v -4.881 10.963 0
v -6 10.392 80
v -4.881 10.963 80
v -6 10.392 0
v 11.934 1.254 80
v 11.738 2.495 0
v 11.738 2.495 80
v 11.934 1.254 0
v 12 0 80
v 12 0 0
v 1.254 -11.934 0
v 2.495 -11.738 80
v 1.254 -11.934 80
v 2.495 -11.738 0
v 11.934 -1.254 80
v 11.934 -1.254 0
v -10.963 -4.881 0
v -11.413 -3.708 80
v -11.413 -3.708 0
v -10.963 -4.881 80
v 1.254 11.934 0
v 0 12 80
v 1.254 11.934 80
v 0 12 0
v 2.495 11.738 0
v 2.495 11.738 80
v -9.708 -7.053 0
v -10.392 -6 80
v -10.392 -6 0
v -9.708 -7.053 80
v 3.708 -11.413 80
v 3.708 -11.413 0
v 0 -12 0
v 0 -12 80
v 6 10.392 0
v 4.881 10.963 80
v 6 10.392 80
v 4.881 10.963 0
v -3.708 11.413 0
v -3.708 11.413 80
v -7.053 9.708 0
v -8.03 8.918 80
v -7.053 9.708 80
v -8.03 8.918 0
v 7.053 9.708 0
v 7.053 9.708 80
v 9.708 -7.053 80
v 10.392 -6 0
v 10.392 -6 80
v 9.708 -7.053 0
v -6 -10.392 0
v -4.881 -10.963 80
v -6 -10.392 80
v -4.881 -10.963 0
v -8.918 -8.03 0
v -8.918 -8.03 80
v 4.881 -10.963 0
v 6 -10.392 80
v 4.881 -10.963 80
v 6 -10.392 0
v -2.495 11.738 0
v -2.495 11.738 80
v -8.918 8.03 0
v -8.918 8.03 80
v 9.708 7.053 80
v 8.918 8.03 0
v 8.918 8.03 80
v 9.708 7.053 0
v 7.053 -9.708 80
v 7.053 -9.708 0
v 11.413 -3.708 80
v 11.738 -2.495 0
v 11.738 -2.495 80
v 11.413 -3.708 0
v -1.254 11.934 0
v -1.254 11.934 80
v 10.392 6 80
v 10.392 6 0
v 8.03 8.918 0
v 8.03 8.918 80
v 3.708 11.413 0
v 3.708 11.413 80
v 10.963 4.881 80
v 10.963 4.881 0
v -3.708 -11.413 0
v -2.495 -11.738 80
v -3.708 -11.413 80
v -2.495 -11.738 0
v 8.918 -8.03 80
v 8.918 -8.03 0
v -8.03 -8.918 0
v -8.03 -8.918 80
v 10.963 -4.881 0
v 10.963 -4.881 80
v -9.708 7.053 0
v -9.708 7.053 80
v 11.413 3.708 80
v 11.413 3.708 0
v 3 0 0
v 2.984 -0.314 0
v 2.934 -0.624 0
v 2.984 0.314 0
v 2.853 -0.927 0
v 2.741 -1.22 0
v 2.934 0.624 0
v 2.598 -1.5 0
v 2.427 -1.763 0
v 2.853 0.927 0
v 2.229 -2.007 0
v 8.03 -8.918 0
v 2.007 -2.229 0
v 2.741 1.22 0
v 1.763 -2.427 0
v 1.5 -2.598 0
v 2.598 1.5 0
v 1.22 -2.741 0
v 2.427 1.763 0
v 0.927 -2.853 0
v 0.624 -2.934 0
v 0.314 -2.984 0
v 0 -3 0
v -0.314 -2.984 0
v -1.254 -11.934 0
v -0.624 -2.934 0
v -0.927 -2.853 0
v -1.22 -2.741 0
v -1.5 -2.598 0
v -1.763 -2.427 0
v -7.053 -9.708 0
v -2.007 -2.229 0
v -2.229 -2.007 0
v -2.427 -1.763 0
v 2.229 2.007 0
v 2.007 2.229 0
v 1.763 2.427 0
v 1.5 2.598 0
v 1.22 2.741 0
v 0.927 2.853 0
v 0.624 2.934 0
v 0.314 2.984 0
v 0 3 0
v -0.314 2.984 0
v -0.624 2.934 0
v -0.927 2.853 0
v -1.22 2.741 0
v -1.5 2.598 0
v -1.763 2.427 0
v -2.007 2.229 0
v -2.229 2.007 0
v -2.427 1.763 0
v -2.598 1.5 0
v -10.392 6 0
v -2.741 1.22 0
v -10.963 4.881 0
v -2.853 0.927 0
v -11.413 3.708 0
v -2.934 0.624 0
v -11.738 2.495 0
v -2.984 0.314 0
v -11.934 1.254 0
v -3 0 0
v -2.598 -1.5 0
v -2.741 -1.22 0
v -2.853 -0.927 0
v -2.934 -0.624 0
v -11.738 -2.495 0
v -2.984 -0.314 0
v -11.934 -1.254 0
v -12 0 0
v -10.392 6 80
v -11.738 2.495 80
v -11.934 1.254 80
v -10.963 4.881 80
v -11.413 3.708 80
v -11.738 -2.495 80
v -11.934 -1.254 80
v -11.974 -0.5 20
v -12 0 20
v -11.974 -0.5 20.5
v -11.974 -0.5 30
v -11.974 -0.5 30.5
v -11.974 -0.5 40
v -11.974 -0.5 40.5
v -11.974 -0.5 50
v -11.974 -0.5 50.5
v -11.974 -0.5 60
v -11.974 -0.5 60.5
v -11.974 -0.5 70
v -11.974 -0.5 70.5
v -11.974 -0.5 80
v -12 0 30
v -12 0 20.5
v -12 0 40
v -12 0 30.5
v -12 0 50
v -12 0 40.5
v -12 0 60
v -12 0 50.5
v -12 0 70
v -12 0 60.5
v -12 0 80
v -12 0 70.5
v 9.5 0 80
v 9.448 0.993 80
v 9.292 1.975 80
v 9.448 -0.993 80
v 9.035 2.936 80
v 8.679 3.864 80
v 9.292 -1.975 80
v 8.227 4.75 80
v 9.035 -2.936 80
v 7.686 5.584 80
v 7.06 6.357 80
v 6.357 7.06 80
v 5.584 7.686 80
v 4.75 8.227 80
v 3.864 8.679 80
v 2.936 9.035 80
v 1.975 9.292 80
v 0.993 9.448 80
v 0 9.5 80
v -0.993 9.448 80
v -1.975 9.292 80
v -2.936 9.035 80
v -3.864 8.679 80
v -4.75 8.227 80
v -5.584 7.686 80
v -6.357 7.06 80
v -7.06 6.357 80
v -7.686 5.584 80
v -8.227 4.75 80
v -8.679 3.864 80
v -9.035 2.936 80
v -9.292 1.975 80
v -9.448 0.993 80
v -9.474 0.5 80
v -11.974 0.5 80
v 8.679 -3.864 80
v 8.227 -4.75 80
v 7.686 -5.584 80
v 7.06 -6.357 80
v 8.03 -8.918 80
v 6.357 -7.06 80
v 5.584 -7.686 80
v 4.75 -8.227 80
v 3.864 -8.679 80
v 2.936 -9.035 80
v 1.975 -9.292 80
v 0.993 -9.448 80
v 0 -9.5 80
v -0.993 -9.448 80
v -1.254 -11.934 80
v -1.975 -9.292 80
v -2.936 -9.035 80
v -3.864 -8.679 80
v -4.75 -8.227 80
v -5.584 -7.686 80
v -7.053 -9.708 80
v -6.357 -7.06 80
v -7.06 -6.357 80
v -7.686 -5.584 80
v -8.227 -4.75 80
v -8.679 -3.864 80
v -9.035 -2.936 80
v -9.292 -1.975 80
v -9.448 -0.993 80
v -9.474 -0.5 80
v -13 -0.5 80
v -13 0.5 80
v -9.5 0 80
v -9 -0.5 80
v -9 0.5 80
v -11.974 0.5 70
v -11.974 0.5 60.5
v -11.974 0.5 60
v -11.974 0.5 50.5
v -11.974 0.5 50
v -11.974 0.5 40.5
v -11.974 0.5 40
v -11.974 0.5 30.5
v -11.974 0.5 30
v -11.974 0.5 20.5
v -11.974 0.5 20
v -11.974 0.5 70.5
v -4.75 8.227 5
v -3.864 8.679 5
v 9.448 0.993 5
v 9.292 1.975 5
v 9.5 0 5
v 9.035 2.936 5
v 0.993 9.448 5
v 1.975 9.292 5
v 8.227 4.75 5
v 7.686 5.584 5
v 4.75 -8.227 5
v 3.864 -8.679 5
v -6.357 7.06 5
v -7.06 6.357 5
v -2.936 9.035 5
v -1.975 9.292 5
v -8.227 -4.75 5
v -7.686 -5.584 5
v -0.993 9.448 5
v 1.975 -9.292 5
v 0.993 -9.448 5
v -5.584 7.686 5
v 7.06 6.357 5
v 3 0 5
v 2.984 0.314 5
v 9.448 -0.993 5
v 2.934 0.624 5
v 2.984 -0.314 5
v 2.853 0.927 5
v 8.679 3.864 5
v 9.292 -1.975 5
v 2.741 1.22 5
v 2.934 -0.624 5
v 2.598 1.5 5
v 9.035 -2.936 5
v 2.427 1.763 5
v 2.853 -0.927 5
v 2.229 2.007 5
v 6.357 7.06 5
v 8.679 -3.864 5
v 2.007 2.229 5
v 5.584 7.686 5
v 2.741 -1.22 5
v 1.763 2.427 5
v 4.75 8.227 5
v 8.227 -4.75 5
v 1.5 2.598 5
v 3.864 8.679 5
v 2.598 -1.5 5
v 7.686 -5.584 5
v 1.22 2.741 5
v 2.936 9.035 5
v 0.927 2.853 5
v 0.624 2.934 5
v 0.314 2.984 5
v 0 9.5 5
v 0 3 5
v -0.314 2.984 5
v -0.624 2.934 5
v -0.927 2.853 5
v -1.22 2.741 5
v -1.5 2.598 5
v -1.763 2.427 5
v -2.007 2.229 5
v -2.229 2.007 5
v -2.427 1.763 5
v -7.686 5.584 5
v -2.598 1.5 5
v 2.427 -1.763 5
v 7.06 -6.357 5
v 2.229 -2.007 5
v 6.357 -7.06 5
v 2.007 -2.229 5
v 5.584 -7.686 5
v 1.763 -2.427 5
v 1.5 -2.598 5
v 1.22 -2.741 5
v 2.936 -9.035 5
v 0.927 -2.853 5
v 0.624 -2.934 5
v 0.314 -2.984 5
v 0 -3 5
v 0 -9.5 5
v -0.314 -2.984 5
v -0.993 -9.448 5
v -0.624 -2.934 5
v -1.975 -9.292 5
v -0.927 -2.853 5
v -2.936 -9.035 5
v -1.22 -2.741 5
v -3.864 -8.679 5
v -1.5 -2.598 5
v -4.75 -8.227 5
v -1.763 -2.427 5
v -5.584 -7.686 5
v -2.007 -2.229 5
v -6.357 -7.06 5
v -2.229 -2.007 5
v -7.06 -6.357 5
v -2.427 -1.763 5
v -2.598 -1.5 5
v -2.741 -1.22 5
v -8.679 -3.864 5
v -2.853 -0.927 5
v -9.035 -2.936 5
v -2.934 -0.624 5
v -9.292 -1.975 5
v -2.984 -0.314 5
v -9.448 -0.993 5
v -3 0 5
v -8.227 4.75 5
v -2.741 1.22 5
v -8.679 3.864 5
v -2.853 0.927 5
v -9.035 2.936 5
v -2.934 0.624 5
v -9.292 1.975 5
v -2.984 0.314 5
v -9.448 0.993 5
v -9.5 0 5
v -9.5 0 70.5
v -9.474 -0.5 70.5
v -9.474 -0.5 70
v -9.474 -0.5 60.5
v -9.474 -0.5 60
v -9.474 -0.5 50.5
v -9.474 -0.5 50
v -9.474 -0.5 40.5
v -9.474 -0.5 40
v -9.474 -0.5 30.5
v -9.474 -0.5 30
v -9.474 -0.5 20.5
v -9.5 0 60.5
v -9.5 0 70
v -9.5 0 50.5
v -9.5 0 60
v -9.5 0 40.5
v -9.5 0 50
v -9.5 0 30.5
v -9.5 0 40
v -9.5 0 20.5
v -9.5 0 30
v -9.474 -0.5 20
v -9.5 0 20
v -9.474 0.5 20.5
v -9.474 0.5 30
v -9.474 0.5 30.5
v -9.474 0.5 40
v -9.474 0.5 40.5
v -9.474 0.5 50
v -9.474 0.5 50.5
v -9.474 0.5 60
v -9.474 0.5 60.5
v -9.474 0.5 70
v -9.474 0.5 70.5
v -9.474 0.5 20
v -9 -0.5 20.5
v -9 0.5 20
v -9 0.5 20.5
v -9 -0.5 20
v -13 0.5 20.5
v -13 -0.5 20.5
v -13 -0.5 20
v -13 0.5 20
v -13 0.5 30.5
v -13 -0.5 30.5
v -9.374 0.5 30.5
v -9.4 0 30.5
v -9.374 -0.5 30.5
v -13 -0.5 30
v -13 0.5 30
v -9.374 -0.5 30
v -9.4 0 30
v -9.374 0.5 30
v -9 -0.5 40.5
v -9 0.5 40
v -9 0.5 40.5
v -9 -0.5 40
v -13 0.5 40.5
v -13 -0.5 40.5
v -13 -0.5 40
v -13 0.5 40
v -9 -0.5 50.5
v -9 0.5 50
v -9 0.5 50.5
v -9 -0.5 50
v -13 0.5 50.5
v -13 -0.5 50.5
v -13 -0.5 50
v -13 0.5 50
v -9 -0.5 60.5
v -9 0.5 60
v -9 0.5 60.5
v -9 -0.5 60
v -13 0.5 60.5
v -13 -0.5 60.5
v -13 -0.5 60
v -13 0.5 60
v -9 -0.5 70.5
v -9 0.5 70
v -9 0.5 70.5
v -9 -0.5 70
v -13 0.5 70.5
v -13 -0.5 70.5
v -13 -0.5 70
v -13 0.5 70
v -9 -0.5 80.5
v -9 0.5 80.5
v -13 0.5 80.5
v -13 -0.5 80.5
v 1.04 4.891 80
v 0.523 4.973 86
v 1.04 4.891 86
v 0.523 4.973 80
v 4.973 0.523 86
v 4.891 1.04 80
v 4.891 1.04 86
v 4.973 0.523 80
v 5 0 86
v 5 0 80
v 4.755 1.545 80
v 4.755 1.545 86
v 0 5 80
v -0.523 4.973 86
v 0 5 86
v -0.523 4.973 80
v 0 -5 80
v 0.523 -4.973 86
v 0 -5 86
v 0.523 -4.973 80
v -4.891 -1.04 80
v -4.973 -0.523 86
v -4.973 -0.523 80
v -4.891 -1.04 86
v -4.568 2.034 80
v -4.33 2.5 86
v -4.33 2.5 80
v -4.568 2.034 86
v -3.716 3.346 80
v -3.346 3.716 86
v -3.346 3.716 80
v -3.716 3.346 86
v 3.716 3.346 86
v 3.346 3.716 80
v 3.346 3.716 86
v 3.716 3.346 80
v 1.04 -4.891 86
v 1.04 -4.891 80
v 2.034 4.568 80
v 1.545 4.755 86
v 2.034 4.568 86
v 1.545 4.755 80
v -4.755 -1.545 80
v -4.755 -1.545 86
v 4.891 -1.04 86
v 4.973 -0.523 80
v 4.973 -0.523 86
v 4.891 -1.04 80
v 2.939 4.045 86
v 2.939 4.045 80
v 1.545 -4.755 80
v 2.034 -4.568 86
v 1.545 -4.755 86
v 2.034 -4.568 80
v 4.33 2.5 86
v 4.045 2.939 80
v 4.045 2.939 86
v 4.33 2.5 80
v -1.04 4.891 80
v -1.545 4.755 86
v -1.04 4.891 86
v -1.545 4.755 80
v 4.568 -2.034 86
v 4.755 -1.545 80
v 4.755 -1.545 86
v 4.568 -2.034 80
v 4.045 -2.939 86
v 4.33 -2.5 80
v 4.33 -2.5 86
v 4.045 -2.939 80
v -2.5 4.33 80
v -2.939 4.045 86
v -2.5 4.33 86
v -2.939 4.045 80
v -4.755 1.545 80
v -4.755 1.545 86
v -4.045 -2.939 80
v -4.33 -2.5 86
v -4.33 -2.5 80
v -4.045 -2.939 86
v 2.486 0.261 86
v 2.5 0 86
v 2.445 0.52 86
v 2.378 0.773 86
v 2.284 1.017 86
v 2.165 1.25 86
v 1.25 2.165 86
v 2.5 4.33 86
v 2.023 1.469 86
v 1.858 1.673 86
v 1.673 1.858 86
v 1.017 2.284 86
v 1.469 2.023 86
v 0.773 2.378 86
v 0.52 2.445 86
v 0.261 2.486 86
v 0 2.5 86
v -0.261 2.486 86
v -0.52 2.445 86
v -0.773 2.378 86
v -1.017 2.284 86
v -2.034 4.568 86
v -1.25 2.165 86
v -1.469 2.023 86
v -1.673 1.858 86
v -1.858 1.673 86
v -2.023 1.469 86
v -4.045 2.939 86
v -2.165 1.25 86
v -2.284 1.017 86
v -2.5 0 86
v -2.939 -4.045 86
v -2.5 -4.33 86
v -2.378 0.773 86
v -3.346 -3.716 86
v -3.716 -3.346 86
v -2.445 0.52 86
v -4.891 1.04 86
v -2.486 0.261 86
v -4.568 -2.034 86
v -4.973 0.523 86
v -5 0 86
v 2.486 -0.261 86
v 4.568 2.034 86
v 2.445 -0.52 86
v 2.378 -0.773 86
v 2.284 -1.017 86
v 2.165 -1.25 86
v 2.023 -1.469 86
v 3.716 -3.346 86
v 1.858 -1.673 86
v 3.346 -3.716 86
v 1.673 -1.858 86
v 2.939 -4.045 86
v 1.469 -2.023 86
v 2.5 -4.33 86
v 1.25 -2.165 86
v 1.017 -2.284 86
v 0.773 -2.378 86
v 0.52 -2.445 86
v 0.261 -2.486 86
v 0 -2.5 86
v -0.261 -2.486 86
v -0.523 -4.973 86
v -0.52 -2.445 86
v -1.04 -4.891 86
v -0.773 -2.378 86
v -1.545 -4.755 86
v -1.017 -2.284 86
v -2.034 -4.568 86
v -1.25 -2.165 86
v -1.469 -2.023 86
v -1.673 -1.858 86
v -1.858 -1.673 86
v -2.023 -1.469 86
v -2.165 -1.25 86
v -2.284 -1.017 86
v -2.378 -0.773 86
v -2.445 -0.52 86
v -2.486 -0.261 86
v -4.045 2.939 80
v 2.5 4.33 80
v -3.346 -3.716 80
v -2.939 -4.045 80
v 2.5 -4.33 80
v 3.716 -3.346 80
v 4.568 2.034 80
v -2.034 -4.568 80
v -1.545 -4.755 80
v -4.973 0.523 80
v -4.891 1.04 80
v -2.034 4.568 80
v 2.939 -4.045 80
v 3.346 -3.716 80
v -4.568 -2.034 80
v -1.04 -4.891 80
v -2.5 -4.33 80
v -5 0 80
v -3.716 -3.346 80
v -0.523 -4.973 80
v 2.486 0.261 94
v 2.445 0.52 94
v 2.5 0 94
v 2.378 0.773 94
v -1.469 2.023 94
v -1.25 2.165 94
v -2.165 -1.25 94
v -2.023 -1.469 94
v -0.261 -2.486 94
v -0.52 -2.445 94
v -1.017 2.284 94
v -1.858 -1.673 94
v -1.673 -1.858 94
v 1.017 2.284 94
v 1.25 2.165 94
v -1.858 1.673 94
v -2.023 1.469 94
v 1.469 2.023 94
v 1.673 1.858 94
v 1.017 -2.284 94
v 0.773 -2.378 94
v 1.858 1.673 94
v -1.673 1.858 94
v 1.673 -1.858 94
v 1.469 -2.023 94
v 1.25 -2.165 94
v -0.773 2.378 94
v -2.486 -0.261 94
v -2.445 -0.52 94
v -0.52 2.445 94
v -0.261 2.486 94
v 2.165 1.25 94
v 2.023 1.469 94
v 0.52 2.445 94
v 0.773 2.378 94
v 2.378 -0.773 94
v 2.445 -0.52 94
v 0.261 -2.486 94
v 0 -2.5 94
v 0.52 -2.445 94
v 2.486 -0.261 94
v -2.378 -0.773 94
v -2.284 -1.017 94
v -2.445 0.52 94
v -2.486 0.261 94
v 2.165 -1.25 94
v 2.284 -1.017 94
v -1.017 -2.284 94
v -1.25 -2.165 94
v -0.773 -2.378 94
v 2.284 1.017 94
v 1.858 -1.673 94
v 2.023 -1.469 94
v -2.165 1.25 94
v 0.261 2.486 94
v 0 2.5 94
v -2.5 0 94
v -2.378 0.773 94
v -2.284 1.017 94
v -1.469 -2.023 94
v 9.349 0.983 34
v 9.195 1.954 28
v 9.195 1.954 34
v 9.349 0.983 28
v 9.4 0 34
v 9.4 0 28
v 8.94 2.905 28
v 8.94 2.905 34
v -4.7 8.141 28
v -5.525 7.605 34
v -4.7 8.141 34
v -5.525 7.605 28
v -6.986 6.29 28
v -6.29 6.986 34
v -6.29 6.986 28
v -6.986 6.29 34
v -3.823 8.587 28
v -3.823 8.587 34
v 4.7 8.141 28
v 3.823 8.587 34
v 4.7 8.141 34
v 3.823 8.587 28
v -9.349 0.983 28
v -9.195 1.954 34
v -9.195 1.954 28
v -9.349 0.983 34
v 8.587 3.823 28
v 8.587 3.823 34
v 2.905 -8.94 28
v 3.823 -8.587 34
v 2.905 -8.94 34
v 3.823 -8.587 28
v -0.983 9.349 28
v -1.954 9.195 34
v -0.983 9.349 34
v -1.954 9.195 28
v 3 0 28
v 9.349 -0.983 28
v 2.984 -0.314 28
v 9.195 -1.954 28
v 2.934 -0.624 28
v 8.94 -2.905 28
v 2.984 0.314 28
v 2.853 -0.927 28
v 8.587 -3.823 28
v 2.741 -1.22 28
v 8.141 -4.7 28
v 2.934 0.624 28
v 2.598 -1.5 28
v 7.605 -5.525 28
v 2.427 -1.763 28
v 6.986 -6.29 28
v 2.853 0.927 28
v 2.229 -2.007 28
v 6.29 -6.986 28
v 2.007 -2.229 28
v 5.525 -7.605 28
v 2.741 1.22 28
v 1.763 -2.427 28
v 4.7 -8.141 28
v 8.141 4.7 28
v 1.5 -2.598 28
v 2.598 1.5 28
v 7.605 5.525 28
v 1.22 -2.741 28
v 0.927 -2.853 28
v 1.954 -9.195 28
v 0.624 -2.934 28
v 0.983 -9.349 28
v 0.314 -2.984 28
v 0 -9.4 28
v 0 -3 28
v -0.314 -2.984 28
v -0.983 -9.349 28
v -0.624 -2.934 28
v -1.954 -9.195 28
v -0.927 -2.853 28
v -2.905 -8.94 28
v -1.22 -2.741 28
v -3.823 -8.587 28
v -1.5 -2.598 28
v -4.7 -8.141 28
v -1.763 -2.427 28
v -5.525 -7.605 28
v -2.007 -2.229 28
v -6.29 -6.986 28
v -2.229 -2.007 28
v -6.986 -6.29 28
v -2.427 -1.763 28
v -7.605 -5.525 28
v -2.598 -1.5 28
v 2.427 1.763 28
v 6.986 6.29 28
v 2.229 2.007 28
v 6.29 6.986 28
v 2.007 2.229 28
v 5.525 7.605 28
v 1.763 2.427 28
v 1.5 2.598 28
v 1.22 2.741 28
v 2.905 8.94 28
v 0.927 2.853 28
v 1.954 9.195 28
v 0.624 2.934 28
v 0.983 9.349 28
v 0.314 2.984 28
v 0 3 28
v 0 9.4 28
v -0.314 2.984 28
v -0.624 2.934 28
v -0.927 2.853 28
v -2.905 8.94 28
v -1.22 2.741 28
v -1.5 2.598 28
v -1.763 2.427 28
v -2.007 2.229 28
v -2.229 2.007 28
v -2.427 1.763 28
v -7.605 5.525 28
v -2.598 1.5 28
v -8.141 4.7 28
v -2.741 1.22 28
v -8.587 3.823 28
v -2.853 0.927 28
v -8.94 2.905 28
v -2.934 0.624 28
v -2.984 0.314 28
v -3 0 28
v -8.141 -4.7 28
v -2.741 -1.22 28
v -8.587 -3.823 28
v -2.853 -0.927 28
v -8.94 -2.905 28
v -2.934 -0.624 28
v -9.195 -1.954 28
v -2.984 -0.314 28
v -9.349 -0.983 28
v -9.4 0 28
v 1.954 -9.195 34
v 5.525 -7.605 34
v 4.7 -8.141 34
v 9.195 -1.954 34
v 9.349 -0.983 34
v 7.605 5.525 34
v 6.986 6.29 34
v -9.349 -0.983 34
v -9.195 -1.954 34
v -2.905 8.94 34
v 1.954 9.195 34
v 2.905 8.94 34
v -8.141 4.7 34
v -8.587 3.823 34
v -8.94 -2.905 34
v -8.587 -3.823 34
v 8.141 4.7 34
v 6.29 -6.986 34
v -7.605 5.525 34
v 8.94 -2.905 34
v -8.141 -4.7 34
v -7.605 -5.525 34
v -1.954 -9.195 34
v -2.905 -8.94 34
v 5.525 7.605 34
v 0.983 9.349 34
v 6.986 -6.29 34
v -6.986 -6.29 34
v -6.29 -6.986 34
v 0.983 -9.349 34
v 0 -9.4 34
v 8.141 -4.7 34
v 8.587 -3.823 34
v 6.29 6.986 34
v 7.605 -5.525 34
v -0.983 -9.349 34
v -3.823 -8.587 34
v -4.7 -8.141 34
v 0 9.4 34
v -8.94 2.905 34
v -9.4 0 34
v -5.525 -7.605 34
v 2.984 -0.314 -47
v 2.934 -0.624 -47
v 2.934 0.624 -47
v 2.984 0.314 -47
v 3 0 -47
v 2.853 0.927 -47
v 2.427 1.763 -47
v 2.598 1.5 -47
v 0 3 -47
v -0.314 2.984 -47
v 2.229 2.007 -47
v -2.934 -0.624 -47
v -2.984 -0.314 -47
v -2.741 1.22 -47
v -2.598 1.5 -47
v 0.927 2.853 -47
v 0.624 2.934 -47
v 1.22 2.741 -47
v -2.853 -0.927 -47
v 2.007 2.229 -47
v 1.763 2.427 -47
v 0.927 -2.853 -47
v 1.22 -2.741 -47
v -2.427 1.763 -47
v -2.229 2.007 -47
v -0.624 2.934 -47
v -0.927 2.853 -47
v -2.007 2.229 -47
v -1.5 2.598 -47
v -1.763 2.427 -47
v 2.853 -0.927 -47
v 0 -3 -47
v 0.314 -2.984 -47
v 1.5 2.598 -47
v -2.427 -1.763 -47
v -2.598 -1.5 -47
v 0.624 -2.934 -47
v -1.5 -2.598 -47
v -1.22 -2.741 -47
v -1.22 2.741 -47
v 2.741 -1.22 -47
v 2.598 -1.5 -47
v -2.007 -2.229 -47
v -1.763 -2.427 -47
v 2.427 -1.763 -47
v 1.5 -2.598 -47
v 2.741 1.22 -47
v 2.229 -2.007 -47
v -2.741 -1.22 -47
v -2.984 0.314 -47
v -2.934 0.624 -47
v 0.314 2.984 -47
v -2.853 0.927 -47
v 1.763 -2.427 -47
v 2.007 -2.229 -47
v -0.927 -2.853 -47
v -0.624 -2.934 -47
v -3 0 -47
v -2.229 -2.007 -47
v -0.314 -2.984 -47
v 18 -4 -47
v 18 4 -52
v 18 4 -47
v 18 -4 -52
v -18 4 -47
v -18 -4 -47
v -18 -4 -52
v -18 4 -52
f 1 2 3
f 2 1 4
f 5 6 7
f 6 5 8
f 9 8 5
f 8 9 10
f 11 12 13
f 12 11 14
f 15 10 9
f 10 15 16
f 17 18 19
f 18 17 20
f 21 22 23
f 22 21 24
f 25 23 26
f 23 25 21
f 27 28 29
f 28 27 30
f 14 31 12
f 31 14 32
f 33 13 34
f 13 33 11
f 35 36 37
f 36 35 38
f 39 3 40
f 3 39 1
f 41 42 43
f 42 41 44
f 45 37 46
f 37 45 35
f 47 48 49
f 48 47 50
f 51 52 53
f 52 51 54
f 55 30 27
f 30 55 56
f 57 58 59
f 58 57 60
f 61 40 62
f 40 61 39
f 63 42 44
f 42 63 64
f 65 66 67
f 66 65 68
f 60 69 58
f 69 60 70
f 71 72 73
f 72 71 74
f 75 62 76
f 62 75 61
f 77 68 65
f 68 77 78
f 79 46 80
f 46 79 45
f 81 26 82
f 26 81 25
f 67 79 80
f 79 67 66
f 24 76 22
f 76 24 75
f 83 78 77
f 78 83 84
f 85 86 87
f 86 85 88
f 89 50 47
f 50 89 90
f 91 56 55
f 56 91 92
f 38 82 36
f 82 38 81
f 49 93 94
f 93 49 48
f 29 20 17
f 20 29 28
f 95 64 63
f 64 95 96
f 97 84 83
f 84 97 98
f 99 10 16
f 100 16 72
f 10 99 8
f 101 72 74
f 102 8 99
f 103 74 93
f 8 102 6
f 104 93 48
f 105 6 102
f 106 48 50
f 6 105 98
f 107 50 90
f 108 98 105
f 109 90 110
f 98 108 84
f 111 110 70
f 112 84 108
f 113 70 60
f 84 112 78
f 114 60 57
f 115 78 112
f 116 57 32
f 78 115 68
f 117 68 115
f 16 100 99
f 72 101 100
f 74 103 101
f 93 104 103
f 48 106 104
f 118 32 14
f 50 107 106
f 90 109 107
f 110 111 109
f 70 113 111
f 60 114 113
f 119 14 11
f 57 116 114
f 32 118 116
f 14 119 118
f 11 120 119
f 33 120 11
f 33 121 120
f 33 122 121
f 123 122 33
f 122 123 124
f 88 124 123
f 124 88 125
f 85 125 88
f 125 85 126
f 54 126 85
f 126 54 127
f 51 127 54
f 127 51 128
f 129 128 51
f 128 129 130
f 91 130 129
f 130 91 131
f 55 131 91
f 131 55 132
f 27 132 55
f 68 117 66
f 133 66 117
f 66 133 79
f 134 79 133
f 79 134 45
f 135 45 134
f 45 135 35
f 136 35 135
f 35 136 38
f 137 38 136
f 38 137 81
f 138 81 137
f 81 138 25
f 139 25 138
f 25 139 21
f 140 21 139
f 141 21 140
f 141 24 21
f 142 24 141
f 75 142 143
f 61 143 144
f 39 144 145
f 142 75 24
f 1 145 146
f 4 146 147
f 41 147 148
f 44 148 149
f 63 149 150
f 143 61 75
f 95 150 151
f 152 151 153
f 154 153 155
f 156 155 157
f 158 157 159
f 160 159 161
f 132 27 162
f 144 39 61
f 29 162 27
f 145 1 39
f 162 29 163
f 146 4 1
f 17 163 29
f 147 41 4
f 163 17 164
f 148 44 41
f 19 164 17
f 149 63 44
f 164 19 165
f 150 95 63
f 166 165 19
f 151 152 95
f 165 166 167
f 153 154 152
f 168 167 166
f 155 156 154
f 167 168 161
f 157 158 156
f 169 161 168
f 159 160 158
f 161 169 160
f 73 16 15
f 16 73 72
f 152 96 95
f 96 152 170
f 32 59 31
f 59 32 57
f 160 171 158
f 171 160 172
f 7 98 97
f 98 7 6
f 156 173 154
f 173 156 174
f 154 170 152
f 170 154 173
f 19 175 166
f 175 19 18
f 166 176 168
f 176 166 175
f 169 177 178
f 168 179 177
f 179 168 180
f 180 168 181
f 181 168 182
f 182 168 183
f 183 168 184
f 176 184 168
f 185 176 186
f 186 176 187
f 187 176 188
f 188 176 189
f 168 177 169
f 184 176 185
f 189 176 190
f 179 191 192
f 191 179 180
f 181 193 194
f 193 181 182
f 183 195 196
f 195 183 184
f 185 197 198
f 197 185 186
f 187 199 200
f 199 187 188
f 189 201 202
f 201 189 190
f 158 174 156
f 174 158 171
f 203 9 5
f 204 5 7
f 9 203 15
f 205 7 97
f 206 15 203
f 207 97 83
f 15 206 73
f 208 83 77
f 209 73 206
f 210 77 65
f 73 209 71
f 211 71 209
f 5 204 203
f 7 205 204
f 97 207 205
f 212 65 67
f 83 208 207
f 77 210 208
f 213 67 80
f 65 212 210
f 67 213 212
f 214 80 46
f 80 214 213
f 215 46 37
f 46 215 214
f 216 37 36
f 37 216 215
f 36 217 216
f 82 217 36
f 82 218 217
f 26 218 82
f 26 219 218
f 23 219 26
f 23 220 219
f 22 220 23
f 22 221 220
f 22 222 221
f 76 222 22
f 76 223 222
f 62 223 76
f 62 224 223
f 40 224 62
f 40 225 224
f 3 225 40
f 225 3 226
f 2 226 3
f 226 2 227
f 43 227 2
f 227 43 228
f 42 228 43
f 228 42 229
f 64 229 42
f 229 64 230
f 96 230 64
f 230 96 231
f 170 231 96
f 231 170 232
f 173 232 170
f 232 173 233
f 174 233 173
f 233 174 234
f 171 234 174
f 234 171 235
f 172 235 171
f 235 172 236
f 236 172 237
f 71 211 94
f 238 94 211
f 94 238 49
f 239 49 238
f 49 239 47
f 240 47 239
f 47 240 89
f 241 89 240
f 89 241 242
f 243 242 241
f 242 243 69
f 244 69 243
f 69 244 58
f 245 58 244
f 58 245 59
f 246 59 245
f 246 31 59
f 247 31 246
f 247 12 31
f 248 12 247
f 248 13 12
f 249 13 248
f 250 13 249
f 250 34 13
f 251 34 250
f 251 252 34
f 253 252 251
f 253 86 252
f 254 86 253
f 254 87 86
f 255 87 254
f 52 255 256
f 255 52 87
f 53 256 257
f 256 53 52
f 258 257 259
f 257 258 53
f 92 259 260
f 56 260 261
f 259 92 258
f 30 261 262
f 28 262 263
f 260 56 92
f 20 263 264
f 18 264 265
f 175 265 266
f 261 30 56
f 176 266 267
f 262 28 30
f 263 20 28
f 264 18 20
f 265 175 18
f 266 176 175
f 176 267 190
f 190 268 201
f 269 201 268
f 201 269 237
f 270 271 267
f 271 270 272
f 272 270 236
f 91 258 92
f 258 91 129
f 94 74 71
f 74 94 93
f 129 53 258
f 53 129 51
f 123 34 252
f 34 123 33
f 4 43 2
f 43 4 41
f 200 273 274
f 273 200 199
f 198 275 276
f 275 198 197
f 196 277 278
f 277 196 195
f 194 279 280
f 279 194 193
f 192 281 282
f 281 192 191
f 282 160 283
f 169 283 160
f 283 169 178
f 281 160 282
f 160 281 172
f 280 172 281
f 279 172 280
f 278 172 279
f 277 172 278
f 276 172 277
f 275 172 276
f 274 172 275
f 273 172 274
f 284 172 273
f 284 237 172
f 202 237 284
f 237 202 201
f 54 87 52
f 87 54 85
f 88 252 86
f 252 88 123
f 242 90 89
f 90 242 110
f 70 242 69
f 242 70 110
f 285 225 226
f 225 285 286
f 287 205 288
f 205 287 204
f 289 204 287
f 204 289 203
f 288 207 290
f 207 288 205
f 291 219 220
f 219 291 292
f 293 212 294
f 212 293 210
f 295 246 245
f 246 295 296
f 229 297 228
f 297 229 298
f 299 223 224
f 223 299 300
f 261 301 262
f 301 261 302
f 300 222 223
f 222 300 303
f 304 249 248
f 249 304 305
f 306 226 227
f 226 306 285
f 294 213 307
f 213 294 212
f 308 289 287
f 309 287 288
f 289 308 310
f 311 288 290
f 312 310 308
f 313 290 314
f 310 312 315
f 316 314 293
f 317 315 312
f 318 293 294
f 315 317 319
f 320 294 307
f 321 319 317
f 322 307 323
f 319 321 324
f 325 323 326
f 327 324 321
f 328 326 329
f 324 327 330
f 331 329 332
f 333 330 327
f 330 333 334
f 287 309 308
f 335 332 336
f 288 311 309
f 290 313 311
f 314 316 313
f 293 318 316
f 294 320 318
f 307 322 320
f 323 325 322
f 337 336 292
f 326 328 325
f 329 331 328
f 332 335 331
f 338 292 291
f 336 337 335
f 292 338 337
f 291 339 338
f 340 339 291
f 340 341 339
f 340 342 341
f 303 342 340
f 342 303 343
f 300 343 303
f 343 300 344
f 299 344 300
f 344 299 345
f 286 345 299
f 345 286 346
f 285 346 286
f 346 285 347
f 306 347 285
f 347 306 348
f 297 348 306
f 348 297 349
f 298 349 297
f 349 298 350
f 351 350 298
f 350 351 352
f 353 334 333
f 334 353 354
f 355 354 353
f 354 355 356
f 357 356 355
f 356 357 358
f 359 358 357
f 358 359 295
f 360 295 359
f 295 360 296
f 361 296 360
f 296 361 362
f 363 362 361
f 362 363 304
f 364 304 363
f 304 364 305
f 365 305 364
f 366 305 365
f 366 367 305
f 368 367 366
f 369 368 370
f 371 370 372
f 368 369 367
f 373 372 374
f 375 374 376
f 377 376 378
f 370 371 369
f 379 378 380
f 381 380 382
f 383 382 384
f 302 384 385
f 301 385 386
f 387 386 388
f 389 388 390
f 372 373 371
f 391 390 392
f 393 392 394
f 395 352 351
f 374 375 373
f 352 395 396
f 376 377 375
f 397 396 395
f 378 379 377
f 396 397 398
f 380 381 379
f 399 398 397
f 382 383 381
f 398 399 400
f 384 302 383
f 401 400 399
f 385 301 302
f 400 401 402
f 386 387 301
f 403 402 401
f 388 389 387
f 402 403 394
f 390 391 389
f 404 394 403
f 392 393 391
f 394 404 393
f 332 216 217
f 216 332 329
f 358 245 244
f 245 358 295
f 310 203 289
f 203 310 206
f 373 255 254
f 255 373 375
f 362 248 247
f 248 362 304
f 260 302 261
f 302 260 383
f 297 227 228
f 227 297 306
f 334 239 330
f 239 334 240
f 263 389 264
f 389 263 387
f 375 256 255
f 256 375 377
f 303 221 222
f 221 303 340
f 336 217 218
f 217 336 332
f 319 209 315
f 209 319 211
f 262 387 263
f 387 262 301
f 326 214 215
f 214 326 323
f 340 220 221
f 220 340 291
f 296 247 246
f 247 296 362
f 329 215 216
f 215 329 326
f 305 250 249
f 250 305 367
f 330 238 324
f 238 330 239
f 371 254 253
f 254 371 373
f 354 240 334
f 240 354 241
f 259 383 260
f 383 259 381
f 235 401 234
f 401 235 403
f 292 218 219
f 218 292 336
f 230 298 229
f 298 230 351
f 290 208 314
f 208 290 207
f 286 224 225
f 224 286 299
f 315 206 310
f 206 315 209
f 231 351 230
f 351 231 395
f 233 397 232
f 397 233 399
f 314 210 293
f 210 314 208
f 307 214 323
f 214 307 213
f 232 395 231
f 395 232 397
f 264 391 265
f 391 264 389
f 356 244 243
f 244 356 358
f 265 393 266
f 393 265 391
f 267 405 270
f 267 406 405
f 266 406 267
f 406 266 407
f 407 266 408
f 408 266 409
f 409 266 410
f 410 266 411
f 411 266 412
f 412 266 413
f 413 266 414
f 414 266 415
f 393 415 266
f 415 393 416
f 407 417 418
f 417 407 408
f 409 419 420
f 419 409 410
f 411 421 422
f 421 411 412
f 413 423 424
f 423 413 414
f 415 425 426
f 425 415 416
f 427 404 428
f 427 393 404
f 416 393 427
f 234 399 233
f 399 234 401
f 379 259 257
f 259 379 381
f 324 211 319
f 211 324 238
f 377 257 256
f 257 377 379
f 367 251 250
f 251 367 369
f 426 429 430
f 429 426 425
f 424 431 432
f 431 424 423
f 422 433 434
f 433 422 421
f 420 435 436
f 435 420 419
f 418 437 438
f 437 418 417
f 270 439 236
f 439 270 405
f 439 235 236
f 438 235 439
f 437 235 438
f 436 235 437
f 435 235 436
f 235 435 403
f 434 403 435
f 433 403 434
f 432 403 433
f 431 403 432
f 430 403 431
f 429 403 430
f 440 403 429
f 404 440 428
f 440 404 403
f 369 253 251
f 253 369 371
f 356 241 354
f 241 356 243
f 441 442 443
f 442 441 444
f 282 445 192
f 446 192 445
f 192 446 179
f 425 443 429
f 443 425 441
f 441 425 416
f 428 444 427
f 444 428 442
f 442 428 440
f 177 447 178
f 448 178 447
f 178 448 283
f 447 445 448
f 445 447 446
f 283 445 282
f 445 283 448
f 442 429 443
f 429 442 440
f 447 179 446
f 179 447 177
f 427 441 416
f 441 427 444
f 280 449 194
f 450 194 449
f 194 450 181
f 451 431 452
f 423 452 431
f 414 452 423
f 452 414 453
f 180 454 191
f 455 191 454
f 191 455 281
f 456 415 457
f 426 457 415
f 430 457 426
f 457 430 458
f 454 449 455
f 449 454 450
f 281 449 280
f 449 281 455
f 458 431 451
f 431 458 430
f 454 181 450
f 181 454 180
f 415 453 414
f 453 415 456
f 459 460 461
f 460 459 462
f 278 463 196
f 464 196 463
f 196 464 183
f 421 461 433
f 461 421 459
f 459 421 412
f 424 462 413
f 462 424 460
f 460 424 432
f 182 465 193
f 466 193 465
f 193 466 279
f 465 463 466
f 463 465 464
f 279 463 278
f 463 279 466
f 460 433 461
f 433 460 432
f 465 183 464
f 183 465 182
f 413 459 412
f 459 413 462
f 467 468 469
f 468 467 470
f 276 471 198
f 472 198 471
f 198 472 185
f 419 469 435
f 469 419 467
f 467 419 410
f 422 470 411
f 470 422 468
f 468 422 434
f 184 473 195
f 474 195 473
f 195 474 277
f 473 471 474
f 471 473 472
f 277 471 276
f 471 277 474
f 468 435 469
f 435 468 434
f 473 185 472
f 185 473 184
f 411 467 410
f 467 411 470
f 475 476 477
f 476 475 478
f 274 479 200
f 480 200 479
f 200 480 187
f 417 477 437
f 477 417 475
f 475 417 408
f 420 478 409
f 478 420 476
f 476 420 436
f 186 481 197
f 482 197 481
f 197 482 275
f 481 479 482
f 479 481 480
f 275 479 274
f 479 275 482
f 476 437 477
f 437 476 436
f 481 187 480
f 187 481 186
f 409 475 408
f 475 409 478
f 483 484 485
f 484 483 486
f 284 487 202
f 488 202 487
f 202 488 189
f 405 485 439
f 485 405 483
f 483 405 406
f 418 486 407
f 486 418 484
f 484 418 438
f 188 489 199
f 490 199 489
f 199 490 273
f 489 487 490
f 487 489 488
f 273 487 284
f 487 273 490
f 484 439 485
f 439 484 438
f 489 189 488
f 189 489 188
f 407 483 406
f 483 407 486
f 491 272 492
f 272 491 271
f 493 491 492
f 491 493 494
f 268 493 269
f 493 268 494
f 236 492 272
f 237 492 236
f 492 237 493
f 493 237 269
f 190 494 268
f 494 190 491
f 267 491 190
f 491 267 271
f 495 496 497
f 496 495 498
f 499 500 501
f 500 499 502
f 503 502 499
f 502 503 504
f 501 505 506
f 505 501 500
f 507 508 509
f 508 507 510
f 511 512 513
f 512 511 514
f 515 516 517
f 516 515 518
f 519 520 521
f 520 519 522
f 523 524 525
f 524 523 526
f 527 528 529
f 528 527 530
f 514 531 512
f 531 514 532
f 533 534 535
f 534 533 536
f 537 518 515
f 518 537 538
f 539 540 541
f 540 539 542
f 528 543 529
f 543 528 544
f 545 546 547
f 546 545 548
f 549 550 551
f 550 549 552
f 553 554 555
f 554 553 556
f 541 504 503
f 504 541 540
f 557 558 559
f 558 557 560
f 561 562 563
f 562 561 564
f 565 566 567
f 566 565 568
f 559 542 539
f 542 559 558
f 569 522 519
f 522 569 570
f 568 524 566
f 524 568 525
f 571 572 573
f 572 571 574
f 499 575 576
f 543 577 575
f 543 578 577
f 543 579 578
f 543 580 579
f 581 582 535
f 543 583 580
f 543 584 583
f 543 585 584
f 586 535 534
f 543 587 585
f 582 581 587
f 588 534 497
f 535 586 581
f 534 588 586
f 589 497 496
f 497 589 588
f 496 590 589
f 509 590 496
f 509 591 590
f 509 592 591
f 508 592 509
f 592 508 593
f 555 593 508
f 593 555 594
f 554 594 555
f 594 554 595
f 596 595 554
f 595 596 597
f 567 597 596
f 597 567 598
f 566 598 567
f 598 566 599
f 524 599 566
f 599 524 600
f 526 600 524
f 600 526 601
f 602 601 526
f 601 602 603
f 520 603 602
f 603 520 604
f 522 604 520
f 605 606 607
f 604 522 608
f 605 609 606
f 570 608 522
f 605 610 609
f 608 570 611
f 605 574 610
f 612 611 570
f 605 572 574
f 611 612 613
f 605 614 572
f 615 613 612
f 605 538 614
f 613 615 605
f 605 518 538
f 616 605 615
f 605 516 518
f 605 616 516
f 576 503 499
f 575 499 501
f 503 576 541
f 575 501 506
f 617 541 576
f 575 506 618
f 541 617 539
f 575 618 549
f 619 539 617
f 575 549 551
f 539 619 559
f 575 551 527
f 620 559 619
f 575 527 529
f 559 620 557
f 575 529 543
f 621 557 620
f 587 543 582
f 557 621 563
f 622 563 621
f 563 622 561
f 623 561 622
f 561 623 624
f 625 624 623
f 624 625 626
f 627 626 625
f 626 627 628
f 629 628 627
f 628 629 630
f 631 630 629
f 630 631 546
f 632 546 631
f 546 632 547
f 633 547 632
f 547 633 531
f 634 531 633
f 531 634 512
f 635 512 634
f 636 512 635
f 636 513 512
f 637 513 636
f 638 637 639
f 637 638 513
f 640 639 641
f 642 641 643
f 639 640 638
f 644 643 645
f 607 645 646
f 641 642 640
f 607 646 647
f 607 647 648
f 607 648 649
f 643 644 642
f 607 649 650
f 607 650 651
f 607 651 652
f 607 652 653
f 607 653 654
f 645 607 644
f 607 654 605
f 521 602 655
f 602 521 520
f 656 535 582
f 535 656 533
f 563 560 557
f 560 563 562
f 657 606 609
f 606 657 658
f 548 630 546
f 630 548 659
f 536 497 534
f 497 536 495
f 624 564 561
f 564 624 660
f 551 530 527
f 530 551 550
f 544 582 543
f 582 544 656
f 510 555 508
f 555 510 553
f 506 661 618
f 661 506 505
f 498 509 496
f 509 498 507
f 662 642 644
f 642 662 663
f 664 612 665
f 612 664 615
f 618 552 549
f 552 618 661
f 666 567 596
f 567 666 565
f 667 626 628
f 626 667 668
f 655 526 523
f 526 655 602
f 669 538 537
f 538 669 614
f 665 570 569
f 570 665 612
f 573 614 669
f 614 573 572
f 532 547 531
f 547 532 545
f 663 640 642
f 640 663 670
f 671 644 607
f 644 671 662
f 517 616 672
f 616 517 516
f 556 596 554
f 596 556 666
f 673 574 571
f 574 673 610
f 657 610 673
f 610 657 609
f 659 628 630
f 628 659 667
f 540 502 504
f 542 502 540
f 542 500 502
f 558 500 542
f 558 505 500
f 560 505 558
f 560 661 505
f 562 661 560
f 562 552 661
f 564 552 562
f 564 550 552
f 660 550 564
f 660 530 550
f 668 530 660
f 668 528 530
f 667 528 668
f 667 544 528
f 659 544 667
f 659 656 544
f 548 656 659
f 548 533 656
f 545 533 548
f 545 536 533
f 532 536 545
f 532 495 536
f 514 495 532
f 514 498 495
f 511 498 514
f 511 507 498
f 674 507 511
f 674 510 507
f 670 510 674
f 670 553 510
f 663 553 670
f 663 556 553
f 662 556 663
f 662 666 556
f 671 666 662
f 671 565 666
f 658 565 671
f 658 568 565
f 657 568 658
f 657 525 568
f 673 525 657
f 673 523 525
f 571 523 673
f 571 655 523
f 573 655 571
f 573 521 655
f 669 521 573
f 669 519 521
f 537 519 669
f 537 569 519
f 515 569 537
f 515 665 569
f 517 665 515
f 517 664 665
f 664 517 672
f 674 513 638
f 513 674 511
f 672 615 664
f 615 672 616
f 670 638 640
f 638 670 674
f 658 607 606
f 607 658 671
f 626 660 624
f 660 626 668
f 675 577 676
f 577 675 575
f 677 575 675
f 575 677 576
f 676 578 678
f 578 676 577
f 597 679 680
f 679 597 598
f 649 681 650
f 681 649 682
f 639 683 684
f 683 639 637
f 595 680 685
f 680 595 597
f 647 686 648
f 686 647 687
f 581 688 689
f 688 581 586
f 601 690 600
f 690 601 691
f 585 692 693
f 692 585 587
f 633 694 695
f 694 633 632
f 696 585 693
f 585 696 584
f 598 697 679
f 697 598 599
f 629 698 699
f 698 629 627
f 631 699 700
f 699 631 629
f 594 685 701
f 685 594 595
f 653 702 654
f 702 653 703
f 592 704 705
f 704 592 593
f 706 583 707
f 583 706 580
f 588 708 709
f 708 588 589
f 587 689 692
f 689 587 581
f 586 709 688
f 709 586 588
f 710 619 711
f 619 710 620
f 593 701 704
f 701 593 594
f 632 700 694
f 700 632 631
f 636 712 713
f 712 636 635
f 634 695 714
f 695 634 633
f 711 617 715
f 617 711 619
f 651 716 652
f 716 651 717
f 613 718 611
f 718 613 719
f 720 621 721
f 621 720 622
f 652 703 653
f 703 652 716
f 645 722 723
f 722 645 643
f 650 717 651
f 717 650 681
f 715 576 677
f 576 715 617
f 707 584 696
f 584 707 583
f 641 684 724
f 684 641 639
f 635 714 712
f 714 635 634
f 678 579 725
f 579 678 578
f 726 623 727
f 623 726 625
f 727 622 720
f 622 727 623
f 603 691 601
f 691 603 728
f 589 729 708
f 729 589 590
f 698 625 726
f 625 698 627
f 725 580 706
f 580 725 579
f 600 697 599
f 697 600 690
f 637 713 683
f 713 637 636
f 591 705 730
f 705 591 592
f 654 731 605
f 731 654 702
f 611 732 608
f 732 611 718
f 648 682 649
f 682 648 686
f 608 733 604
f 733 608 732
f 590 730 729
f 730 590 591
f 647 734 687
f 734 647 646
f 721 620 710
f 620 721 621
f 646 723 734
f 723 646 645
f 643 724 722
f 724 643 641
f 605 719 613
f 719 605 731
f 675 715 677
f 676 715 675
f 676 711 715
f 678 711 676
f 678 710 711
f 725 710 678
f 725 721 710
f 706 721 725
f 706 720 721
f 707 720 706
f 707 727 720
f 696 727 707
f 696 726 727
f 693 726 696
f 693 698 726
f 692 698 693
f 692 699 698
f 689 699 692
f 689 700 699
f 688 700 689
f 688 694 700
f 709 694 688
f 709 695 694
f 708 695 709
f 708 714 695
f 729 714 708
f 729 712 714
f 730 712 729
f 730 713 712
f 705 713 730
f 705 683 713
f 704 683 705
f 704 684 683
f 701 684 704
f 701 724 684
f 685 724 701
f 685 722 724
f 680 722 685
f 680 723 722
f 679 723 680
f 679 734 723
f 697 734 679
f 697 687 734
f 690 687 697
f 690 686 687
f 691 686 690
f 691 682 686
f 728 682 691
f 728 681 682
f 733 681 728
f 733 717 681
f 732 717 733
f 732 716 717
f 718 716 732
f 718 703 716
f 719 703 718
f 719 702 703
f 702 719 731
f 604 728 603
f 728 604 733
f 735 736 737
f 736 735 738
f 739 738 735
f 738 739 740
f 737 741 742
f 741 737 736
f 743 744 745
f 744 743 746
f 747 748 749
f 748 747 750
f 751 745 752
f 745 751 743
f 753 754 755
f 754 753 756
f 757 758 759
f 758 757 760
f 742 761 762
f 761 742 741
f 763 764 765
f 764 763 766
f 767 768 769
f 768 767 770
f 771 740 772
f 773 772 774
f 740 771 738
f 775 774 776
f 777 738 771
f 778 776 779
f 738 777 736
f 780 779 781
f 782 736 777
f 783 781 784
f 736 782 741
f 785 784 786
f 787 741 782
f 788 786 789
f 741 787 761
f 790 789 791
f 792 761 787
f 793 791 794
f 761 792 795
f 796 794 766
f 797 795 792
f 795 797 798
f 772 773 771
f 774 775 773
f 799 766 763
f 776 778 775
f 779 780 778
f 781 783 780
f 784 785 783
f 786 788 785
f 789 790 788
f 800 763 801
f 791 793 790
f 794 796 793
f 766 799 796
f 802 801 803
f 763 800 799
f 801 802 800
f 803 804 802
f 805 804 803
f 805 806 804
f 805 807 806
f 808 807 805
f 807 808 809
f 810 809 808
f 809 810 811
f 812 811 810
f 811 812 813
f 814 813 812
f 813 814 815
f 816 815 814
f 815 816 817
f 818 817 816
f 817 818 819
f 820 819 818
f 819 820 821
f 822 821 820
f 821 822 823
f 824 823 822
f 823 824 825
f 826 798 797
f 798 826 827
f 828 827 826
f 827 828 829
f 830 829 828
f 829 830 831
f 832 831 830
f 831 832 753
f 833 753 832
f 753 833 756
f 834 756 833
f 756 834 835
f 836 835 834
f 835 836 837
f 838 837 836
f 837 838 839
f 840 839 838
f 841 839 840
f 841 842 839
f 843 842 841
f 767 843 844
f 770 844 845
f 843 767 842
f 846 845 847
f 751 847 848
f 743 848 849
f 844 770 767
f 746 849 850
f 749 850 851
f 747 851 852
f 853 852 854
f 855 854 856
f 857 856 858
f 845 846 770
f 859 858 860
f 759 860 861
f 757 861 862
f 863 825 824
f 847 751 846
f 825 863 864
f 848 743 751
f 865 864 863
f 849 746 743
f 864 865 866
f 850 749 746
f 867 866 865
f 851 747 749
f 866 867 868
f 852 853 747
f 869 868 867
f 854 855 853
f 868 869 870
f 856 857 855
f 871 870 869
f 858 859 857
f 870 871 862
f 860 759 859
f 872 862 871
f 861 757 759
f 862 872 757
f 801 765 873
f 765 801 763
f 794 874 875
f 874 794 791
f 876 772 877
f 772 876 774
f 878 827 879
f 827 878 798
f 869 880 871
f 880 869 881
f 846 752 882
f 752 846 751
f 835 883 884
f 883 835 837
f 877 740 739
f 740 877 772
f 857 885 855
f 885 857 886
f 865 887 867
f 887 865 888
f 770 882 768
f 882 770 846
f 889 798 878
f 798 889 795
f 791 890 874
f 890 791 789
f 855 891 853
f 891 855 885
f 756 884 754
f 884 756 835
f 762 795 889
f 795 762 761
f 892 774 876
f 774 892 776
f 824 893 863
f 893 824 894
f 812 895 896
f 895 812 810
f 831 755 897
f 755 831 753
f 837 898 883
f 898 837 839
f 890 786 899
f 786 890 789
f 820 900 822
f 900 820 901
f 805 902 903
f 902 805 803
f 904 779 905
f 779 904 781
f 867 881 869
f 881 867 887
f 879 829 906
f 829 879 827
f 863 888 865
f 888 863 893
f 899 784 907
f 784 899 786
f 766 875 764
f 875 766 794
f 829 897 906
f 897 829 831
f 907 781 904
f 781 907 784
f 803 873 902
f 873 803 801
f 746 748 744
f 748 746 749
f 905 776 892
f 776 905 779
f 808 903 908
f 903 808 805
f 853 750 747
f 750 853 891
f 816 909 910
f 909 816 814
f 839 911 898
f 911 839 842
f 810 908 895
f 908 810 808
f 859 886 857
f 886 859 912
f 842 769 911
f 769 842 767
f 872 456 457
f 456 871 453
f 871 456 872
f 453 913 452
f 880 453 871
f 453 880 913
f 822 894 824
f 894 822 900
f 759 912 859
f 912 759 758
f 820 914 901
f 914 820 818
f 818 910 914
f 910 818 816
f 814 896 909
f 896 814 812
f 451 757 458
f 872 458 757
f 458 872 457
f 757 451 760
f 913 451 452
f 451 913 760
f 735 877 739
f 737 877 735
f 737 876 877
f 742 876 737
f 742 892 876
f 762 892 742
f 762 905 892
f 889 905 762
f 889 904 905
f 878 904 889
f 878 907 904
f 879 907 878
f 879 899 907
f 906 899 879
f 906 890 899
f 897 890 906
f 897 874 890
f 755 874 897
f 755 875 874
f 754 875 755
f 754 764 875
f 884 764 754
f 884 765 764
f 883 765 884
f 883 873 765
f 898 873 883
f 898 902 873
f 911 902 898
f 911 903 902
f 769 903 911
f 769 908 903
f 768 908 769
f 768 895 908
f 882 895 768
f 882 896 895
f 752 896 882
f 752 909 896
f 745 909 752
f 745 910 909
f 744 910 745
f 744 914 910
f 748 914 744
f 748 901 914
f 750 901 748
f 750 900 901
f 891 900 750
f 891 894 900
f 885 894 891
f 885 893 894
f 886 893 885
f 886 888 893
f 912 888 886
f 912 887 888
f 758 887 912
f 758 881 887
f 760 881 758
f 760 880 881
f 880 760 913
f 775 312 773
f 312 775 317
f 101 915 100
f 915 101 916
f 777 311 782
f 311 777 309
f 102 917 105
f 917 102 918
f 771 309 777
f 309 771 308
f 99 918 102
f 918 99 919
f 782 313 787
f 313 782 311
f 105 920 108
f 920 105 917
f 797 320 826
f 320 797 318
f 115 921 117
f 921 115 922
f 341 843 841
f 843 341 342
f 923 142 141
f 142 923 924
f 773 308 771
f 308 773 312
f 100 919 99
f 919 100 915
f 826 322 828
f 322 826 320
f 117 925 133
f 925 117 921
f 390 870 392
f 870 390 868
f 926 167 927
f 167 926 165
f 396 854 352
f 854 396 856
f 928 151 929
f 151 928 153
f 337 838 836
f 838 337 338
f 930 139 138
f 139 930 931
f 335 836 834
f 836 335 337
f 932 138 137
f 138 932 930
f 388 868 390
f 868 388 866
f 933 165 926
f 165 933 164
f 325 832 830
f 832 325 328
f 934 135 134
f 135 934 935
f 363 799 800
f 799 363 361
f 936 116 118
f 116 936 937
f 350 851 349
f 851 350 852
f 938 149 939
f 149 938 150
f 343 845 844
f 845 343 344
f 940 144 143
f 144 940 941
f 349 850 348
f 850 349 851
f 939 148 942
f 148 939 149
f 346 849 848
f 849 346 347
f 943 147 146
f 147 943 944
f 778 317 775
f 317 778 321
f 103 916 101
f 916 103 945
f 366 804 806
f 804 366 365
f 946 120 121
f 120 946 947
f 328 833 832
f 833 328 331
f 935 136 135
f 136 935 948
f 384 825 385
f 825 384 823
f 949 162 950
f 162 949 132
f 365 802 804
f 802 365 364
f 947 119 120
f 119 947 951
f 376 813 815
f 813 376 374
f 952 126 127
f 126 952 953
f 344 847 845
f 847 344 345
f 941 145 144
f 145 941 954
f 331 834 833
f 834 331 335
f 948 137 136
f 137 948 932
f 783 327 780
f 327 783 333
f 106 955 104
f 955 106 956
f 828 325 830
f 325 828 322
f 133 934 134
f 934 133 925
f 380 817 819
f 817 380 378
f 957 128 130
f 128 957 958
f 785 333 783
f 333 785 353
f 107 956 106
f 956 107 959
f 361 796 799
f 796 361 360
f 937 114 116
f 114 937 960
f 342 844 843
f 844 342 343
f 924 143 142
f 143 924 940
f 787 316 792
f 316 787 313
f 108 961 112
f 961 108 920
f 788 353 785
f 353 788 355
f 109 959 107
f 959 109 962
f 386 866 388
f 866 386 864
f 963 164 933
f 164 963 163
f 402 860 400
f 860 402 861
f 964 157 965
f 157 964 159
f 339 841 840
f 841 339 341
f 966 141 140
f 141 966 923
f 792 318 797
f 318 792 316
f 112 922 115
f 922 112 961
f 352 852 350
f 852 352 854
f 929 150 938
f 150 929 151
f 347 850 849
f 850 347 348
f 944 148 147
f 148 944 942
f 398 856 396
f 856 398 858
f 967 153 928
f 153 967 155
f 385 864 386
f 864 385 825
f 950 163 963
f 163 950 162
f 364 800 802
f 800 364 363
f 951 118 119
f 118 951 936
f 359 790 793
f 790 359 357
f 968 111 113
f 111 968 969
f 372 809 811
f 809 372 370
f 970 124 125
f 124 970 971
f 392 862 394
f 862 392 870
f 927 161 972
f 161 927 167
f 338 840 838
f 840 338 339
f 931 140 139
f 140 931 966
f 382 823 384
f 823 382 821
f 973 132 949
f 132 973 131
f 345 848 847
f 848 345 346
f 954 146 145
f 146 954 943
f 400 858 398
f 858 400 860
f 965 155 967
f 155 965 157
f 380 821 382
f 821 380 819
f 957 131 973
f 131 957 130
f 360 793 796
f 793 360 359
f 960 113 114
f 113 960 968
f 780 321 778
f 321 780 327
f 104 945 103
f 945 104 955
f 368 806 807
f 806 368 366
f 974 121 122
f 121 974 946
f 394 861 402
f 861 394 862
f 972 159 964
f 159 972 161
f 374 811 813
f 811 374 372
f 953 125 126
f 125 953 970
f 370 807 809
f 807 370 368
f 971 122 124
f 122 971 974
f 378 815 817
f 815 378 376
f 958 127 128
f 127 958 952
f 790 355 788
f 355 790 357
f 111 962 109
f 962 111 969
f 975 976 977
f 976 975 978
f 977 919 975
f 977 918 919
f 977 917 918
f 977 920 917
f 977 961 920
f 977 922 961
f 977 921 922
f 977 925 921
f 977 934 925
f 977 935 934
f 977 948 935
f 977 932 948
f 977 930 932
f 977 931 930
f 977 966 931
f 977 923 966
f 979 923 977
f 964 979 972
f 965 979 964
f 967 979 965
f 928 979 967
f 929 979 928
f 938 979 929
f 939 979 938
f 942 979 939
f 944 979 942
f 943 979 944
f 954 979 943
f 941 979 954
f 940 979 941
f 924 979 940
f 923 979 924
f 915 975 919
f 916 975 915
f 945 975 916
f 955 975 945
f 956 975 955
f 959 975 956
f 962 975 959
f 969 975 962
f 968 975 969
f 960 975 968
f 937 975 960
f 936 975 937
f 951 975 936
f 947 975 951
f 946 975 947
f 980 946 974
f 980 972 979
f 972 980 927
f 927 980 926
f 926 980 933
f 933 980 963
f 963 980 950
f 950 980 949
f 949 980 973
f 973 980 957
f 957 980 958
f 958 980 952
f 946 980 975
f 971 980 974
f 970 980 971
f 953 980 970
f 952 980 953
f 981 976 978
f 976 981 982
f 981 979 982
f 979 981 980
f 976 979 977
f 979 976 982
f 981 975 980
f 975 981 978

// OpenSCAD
// file: _common.scad
// mechanism 共用設定 + 齒輪 module
$fn = 60;

// 簡化齒輪：N 個齒、節圓半徑 r、齒高 h、齒寬 w
module simple_gear(N = 16, r = 20, h = 4, thick = 6) {
  union() {
    // 主圓盤
    cylinder(h = thick, r = r, center = true);
    // 齒（梯形）
    for (i = [0:N-1]) {
      rotate([0, 0, i * 360 / N])
        translate([r, 0, 0])
          linear_extrude(height = thick, center = true)
            polygon([[0, -2.4], [h, -1.4], [h, 1.4], [0, 2.4]]);
    }
    // 中心凸軸
    cylinder(h = thick * 1.4, r = r * 0.18, center = true);
  }
}
// main file
// 針筒（液壓缸） — 透明筒身 + 活塞 + 推桿
include <_common.scad>

// 筒身（外壁）
color([0.85, 0.92, 0.98, 0.8])
  difference() {
    cylinder(h = 80, r = 12);
    translate([0, 0, 5]) cylinder(h = 78, r = 9.5);
  }

// 筒底蓋
color([0.7, 0.75, 0.80])
  cylinder(h = 5, r = 12);

// 前端出水口
color([0.7, 0.75, 0.80])
  translate([0, 0, 80]) cylinder(h = 6, r = 5);
color([0.5, 0.55, 0.6])
  translate([0, 0, 86]) cylinder(h = 8, r = 2.5);

// 刻度線
color([0.3, 0.3, 0.3])
  for (i = [1:7])
    translate([-13, -0.5, 10 + i * 10]) cube([4, 1, 0.5]);

// 活塞（在筒內，橡膠黑色）
color([0.15, 0.15, 0.15])
  translate([0, 0, 28]) cylinder(h = 6, r = 9.4);

// 推桿
color([0.75, 0.75, 0.78])
  translate([0, 0, -50]) cylinder(h = 78, r = 3);

// 推桿手柄（T形）
color([0.2, 0.2, 0.22])
  translate([-18, -4, -52]) cube([36, 8, 5]);
